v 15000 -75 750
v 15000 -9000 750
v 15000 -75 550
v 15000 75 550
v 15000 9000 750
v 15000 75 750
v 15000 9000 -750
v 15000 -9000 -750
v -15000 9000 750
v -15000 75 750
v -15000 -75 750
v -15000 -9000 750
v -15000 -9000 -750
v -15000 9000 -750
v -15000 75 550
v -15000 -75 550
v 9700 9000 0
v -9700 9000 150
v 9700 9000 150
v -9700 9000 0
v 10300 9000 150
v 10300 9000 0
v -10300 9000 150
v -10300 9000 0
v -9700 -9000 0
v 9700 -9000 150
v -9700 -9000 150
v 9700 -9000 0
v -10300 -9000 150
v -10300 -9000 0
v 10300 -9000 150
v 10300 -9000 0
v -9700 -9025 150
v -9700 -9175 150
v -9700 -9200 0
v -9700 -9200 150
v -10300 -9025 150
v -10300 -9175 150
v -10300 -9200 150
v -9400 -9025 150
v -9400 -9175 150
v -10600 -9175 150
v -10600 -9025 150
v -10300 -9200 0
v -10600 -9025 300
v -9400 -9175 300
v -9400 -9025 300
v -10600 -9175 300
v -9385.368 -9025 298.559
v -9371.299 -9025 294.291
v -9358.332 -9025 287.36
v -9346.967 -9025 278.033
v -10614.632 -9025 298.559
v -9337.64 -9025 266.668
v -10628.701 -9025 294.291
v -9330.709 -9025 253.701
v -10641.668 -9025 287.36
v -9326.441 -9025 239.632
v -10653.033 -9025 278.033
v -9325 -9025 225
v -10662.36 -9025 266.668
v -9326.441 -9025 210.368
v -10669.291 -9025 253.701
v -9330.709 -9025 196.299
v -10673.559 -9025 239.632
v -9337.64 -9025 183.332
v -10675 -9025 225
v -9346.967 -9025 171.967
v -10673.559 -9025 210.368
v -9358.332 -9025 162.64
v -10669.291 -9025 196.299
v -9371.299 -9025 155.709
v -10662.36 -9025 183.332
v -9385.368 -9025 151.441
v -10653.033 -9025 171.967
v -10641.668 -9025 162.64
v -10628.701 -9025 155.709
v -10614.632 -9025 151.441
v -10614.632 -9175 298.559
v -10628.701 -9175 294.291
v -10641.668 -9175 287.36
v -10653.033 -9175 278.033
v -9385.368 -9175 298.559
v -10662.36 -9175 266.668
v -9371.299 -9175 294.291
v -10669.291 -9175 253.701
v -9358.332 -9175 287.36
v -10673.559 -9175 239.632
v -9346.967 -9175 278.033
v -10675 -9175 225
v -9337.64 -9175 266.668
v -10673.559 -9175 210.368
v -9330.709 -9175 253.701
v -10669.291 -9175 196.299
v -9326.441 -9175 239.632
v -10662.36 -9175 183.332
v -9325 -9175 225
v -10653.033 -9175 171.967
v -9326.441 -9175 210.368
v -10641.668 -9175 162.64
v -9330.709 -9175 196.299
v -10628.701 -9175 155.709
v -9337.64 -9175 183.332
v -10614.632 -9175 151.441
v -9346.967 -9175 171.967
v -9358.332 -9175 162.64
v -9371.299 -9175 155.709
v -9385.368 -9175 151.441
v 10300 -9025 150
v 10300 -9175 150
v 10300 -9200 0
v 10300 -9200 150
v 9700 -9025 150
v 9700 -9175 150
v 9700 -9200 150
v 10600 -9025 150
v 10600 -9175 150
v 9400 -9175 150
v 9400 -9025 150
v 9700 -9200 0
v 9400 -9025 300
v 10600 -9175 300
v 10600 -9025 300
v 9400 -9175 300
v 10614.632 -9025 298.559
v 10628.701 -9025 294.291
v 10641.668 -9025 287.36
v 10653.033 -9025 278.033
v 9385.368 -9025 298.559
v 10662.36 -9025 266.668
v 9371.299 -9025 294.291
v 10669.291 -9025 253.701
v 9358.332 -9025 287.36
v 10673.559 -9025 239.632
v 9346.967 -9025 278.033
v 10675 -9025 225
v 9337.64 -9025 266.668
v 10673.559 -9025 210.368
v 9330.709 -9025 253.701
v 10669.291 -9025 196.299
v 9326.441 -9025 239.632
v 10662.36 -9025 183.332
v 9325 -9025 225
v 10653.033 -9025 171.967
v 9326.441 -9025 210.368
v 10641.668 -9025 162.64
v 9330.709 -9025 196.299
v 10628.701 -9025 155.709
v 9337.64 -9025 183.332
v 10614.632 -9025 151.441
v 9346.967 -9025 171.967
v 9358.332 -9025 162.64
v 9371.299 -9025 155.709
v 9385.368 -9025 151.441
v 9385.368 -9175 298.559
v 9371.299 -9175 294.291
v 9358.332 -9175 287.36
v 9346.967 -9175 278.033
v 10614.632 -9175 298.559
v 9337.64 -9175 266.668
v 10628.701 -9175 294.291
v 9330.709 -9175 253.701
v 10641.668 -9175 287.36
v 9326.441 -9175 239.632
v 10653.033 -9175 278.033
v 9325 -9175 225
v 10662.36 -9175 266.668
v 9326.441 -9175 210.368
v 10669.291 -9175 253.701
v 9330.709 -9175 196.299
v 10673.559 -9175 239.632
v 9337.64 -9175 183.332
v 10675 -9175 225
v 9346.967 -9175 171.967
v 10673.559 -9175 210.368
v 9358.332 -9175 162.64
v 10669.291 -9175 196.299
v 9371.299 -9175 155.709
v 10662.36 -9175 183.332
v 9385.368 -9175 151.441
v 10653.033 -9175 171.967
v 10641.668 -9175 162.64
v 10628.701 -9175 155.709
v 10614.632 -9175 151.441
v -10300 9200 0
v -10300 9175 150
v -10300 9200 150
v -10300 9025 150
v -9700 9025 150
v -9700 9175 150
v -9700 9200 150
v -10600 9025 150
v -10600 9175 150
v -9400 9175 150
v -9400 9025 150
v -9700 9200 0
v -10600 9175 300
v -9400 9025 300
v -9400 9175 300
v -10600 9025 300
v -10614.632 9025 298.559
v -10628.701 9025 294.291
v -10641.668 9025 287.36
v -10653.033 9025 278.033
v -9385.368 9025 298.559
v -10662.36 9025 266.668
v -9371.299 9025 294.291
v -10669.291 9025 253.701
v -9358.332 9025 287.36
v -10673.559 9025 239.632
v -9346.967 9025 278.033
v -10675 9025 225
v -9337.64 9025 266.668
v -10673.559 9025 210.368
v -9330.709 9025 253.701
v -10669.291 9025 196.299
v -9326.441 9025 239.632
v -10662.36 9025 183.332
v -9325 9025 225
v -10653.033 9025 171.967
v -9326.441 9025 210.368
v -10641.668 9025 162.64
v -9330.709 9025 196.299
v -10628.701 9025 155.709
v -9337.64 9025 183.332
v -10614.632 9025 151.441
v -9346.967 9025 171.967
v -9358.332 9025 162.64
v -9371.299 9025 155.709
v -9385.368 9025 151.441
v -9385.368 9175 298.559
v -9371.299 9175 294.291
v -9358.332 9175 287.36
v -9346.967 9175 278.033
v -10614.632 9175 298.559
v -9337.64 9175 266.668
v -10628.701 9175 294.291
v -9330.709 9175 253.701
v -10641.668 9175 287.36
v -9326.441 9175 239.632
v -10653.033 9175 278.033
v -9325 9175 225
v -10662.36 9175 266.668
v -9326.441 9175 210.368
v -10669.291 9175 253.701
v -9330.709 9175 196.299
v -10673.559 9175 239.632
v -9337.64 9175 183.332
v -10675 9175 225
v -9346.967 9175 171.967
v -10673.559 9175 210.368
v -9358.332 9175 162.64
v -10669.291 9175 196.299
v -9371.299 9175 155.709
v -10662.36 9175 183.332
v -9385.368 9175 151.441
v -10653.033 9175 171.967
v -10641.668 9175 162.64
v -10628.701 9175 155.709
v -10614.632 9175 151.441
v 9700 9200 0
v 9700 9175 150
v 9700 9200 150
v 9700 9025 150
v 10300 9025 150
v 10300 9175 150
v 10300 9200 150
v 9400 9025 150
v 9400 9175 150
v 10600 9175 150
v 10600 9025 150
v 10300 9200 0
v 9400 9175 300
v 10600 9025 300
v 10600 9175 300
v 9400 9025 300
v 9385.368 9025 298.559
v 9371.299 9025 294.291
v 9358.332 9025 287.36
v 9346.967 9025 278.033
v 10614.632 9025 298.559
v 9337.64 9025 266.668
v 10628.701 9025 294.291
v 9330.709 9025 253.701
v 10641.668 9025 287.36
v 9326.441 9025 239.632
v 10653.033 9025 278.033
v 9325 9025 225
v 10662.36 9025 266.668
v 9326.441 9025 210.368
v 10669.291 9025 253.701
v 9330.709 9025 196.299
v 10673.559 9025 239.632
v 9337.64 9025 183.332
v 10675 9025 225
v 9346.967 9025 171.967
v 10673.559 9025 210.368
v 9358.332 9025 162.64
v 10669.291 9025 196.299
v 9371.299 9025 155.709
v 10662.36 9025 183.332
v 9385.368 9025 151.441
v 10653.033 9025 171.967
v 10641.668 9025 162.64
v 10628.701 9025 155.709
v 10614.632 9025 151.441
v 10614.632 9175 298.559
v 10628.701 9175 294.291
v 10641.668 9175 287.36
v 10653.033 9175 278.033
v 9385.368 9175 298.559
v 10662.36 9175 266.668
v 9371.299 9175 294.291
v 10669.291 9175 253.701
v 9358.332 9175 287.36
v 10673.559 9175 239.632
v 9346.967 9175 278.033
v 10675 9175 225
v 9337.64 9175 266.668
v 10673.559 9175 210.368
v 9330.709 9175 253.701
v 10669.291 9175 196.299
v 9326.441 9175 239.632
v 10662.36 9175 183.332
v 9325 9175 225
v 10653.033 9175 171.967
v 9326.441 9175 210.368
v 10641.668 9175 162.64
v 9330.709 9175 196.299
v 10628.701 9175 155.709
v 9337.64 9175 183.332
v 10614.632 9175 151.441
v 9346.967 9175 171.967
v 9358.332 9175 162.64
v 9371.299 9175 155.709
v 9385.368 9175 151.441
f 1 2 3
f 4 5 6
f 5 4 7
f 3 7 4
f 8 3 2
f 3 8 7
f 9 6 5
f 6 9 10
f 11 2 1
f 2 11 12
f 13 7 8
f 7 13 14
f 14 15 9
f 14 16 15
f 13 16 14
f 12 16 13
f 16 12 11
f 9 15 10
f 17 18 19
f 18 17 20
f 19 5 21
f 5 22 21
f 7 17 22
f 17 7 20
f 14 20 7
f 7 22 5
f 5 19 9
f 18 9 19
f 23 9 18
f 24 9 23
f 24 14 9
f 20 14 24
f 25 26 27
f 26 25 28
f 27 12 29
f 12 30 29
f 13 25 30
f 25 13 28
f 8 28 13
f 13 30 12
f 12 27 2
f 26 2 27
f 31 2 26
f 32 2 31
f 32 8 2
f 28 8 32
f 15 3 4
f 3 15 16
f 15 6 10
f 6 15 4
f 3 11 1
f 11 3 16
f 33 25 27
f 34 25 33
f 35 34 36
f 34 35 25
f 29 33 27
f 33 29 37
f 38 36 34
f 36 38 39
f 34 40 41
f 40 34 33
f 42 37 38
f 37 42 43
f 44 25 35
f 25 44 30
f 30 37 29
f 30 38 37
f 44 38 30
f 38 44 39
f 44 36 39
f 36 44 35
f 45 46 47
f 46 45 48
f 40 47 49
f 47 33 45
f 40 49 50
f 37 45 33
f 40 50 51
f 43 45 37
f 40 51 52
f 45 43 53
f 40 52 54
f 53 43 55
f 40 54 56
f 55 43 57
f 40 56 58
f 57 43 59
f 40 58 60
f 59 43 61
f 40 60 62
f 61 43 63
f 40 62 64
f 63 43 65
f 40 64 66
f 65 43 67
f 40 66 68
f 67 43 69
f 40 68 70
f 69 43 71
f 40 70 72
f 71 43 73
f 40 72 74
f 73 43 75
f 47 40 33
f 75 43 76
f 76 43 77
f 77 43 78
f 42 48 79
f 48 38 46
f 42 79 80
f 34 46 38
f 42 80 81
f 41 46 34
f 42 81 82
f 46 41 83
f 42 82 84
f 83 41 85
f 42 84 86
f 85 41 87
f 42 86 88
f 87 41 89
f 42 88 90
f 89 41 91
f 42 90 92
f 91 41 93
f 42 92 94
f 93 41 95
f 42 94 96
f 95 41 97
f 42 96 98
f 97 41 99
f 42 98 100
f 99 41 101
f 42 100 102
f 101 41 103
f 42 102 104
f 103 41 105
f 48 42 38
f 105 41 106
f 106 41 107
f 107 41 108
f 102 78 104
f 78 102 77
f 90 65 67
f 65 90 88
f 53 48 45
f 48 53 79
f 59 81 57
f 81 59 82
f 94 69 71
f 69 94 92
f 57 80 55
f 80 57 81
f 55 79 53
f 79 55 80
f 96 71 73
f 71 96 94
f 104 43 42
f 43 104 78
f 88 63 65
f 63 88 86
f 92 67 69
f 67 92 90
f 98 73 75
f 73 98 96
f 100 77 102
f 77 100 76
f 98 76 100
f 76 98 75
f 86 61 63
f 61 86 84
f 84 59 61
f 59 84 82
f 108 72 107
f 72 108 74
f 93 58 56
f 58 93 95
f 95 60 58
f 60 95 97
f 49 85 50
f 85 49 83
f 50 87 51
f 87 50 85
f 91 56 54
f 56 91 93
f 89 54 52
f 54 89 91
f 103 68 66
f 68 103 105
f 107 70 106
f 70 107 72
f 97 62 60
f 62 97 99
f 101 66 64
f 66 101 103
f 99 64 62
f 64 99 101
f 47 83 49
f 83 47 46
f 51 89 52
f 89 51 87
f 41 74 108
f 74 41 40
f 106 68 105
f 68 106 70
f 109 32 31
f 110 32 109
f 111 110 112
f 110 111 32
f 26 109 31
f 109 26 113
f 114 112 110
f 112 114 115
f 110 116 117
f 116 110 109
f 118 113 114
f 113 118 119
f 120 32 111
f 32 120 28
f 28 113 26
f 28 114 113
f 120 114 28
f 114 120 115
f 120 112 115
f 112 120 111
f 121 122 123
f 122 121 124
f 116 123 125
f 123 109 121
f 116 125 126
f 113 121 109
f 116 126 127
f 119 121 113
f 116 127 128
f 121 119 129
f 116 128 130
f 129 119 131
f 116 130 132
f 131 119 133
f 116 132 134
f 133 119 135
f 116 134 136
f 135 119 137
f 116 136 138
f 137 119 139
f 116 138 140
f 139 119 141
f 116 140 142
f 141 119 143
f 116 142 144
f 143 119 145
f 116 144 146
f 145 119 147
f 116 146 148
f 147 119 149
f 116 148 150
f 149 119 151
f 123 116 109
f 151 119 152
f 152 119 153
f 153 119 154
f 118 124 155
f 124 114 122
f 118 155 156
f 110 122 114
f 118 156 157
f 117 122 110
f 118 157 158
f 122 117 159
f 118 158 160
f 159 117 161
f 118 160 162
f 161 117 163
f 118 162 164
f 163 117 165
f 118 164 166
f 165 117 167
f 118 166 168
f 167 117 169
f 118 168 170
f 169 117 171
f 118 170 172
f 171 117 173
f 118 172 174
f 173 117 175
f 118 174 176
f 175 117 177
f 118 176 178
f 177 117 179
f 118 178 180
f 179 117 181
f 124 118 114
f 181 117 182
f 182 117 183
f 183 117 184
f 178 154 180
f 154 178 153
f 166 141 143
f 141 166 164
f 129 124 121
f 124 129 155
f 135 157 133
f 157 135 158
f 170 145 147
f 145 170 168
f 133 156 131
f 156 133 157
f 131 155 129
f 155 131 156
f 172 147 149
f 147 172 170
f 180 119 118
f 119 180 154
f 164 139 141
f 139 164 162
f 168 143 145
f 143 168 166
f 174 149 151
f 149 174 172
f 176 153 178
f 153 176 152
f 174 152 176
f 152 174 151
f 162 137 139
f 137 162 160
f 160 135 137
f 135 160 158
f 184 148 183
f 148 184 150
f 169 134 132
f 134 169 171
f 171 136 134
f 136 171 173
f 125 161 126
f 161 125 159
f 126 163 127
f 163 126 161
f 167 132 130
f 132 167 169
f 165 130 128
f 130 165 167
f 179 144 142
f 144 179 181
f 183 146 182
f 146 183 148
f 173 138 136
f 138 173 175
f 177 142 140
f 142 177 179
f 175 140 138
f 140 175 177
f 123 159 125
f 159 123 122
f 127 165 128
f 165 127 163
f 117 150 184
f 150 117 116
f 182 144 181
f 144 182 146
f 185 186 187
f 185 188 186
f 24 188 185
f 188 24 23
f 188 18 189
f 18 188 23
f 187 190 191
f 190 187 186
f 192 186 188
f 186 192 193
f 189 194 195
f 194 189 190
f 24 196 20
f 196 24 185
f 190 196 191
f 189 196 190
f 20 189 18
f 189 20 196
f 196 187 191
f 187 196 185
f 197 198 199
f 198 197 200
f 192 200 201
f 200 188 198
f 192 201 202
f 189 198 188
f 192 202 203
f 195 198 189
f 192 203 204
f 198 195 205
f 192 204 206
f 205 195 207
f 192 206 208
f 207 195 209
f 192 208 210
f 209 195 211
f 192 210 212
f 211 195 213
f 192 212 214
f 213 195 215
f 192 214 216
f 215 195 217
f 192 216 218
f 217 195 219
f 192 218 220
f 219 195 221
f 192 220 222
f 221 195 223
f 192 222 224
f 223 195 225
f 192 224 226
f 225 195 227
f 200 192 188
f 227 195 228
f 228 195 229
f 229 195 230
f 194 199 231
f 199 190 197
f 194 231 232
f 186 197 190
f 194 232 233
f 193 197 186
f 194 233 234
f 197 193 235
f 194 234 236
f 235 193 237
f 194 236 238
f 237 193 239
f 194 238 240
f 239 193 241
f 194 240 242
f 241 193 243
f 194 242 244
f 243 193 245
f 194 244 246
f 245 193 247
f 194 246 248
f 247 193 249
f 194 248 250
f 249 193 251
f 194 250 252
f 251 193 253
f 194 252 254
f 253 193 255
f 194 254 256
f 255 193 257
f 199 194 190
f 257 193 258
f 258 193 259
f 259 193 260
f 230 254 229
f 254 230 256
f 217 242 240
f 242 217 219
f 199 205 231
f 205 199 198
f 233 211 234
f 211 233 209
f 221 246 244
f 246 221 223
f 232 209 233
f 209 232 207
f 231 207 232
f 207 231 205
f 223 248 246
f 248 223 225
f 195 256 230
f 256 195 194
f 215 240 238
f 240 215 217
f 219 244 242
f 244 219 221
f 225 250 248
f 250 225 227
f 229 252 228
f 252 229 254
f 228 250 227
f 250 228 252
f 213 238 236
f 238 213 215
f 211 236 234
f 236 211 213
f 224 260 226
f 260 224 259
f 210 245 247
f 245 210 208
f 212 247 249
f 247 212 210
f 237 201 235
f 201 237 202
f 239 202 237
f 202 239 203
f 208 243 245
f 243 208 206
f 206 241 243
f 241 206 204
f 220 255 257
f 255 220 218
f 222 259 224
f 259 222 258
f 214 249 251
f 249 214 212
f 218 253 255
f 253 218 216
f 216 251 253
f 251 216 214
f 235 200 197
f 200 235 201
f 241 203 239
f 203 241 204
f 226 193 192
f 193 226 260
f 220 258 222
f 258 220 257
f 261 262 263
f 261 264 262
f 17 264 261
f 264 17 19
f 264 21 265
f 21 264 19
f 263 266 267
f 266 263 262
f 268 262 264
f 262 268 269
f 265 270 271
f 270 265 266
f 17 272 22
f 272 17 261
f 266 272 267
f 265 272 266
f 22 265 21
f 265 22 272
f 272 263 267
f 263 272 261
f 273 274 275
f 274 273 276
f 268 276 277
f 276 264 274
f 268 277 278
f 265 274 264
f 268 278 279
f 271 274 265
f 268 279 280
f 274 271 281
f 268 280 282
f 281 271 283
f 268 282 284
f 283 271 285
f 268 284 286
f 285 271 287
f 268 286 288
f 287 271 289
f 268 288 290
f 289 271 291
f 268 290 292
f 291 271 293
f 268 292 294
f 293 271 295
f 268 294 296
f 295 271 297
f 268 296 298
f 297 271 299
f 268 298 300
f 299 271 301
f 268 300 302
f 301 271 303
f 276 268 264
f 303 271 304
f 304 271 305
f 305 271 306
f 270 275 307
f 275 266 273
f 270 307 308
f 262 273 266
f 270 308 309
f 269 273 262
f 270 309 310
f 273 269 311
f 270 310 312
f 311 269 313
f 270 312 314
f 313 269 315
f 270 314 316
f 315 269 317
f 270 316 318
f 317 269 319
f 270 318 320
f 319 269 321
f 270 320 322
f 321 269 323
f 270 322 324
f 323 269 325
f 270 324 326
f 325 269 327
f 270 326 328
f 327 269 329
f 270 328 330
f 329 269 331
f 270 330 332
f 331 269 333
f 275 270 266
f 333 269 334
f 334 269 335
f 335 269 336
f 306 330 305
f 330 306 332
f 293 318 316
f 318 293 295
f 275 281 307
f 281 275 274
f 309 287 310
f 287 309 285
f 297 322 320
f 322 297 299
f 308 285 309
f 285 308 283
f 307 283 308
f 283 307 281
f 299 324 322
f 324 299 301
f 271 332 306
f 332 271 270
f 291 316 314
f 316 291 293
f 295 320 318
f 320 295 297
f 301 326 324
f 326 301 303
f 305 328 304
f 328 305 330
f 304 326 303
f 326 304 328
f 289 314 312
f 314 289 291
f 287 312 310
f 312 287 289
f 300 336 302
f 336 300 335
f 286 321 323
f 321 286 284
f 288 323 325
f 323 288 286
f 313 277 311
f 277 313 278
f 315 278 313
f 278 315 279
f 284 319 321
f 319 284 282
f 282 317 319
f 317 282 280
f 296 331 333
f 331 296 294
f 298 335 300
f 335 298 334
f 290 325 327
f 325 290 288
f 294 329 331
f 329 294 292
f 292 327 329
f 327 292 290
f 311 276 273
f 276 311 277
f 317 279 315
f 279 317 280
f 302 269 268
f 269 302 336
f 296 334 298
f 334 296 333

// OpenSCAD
// =========================================================================
// GRUMMAN-STYLED INFLATABLE CARRIER - INTEGRATED MOORING CLEAT ASSEMBLY
// MANUFACTURER: HUNTINGTON INGALLS / NEWPORT NEWS SHIPBUILDING
// MATERIAL SPECIFICATION: TITANIUM GRADE 5 PARALLEL RIGGING ANCHORS
// =========================================================================

module titanium_mooring_cleat(base_l=600, base_w=200, horn_l=1200, horn_h=300) {
    // Solid-state cast anchor mounting directly to the plate side wall margins
    union() {
        // Base Anchor Pillar
        translate([0, 0, horn_h/4])
            cube([base_l, base_w, horn_h/2], center=true);
            
        // Flared Cleat Horns (Accepts heavy rope, steel cable, or trailing lines)
        translate([0, 0, horn_h/2 + horn_h/4])
            cube([horn_l, base_w - 50, horn_h/2], center=true);
            
        // Smooth radiused fillets at the tie-down horns to minimize line chafing
        translate([-horn_l/2, 0, horn_h/2 + horn_h/4])
            rotate([90, 0, 0]) cylinder(h=base_w - 50, r=horn_h/4, center=true, $fn=32);
        translate([horn_l/2, 0, horn_h/2 + horn_h/4])
            rotate([90, 0, 0]) cylinder(h=base_w - 50, r=horn_h/4, center=true, $fn=32);
    }
}

module carrier_plate_with_rigging() {
    // Reference base plate from solid_state_harness.scad
    difference() {
        cube([30000, 18000, 1500], center=true);
        // Core internal conduit cuts for the solid-state framework electrical harness
        translate([0, 0, 1500/2 - 100]) cube([30020, 150, 200], center=true);
    }
    
    // Distribute mooring cleats symmetrically along left and right titanium hull margins
    translate([-10000, -18000/2 - 100, 0]) titanium_mooring_cleat();
    translate([10000, -18000/2 - 100, 0])  titanium_mooring_cleat();
    translate([-10000, 18000/2 + 100, 0])  rotate([0, 0, 180]) titanium_mooring_cleat();
    translate([10000, 18000/2 + 100, 0])   rotate([0, 0, 180]) titanium_mooring_cleat();
}

// Instantiate fully rigged plate segment
carrier_plate_with_rigging();
